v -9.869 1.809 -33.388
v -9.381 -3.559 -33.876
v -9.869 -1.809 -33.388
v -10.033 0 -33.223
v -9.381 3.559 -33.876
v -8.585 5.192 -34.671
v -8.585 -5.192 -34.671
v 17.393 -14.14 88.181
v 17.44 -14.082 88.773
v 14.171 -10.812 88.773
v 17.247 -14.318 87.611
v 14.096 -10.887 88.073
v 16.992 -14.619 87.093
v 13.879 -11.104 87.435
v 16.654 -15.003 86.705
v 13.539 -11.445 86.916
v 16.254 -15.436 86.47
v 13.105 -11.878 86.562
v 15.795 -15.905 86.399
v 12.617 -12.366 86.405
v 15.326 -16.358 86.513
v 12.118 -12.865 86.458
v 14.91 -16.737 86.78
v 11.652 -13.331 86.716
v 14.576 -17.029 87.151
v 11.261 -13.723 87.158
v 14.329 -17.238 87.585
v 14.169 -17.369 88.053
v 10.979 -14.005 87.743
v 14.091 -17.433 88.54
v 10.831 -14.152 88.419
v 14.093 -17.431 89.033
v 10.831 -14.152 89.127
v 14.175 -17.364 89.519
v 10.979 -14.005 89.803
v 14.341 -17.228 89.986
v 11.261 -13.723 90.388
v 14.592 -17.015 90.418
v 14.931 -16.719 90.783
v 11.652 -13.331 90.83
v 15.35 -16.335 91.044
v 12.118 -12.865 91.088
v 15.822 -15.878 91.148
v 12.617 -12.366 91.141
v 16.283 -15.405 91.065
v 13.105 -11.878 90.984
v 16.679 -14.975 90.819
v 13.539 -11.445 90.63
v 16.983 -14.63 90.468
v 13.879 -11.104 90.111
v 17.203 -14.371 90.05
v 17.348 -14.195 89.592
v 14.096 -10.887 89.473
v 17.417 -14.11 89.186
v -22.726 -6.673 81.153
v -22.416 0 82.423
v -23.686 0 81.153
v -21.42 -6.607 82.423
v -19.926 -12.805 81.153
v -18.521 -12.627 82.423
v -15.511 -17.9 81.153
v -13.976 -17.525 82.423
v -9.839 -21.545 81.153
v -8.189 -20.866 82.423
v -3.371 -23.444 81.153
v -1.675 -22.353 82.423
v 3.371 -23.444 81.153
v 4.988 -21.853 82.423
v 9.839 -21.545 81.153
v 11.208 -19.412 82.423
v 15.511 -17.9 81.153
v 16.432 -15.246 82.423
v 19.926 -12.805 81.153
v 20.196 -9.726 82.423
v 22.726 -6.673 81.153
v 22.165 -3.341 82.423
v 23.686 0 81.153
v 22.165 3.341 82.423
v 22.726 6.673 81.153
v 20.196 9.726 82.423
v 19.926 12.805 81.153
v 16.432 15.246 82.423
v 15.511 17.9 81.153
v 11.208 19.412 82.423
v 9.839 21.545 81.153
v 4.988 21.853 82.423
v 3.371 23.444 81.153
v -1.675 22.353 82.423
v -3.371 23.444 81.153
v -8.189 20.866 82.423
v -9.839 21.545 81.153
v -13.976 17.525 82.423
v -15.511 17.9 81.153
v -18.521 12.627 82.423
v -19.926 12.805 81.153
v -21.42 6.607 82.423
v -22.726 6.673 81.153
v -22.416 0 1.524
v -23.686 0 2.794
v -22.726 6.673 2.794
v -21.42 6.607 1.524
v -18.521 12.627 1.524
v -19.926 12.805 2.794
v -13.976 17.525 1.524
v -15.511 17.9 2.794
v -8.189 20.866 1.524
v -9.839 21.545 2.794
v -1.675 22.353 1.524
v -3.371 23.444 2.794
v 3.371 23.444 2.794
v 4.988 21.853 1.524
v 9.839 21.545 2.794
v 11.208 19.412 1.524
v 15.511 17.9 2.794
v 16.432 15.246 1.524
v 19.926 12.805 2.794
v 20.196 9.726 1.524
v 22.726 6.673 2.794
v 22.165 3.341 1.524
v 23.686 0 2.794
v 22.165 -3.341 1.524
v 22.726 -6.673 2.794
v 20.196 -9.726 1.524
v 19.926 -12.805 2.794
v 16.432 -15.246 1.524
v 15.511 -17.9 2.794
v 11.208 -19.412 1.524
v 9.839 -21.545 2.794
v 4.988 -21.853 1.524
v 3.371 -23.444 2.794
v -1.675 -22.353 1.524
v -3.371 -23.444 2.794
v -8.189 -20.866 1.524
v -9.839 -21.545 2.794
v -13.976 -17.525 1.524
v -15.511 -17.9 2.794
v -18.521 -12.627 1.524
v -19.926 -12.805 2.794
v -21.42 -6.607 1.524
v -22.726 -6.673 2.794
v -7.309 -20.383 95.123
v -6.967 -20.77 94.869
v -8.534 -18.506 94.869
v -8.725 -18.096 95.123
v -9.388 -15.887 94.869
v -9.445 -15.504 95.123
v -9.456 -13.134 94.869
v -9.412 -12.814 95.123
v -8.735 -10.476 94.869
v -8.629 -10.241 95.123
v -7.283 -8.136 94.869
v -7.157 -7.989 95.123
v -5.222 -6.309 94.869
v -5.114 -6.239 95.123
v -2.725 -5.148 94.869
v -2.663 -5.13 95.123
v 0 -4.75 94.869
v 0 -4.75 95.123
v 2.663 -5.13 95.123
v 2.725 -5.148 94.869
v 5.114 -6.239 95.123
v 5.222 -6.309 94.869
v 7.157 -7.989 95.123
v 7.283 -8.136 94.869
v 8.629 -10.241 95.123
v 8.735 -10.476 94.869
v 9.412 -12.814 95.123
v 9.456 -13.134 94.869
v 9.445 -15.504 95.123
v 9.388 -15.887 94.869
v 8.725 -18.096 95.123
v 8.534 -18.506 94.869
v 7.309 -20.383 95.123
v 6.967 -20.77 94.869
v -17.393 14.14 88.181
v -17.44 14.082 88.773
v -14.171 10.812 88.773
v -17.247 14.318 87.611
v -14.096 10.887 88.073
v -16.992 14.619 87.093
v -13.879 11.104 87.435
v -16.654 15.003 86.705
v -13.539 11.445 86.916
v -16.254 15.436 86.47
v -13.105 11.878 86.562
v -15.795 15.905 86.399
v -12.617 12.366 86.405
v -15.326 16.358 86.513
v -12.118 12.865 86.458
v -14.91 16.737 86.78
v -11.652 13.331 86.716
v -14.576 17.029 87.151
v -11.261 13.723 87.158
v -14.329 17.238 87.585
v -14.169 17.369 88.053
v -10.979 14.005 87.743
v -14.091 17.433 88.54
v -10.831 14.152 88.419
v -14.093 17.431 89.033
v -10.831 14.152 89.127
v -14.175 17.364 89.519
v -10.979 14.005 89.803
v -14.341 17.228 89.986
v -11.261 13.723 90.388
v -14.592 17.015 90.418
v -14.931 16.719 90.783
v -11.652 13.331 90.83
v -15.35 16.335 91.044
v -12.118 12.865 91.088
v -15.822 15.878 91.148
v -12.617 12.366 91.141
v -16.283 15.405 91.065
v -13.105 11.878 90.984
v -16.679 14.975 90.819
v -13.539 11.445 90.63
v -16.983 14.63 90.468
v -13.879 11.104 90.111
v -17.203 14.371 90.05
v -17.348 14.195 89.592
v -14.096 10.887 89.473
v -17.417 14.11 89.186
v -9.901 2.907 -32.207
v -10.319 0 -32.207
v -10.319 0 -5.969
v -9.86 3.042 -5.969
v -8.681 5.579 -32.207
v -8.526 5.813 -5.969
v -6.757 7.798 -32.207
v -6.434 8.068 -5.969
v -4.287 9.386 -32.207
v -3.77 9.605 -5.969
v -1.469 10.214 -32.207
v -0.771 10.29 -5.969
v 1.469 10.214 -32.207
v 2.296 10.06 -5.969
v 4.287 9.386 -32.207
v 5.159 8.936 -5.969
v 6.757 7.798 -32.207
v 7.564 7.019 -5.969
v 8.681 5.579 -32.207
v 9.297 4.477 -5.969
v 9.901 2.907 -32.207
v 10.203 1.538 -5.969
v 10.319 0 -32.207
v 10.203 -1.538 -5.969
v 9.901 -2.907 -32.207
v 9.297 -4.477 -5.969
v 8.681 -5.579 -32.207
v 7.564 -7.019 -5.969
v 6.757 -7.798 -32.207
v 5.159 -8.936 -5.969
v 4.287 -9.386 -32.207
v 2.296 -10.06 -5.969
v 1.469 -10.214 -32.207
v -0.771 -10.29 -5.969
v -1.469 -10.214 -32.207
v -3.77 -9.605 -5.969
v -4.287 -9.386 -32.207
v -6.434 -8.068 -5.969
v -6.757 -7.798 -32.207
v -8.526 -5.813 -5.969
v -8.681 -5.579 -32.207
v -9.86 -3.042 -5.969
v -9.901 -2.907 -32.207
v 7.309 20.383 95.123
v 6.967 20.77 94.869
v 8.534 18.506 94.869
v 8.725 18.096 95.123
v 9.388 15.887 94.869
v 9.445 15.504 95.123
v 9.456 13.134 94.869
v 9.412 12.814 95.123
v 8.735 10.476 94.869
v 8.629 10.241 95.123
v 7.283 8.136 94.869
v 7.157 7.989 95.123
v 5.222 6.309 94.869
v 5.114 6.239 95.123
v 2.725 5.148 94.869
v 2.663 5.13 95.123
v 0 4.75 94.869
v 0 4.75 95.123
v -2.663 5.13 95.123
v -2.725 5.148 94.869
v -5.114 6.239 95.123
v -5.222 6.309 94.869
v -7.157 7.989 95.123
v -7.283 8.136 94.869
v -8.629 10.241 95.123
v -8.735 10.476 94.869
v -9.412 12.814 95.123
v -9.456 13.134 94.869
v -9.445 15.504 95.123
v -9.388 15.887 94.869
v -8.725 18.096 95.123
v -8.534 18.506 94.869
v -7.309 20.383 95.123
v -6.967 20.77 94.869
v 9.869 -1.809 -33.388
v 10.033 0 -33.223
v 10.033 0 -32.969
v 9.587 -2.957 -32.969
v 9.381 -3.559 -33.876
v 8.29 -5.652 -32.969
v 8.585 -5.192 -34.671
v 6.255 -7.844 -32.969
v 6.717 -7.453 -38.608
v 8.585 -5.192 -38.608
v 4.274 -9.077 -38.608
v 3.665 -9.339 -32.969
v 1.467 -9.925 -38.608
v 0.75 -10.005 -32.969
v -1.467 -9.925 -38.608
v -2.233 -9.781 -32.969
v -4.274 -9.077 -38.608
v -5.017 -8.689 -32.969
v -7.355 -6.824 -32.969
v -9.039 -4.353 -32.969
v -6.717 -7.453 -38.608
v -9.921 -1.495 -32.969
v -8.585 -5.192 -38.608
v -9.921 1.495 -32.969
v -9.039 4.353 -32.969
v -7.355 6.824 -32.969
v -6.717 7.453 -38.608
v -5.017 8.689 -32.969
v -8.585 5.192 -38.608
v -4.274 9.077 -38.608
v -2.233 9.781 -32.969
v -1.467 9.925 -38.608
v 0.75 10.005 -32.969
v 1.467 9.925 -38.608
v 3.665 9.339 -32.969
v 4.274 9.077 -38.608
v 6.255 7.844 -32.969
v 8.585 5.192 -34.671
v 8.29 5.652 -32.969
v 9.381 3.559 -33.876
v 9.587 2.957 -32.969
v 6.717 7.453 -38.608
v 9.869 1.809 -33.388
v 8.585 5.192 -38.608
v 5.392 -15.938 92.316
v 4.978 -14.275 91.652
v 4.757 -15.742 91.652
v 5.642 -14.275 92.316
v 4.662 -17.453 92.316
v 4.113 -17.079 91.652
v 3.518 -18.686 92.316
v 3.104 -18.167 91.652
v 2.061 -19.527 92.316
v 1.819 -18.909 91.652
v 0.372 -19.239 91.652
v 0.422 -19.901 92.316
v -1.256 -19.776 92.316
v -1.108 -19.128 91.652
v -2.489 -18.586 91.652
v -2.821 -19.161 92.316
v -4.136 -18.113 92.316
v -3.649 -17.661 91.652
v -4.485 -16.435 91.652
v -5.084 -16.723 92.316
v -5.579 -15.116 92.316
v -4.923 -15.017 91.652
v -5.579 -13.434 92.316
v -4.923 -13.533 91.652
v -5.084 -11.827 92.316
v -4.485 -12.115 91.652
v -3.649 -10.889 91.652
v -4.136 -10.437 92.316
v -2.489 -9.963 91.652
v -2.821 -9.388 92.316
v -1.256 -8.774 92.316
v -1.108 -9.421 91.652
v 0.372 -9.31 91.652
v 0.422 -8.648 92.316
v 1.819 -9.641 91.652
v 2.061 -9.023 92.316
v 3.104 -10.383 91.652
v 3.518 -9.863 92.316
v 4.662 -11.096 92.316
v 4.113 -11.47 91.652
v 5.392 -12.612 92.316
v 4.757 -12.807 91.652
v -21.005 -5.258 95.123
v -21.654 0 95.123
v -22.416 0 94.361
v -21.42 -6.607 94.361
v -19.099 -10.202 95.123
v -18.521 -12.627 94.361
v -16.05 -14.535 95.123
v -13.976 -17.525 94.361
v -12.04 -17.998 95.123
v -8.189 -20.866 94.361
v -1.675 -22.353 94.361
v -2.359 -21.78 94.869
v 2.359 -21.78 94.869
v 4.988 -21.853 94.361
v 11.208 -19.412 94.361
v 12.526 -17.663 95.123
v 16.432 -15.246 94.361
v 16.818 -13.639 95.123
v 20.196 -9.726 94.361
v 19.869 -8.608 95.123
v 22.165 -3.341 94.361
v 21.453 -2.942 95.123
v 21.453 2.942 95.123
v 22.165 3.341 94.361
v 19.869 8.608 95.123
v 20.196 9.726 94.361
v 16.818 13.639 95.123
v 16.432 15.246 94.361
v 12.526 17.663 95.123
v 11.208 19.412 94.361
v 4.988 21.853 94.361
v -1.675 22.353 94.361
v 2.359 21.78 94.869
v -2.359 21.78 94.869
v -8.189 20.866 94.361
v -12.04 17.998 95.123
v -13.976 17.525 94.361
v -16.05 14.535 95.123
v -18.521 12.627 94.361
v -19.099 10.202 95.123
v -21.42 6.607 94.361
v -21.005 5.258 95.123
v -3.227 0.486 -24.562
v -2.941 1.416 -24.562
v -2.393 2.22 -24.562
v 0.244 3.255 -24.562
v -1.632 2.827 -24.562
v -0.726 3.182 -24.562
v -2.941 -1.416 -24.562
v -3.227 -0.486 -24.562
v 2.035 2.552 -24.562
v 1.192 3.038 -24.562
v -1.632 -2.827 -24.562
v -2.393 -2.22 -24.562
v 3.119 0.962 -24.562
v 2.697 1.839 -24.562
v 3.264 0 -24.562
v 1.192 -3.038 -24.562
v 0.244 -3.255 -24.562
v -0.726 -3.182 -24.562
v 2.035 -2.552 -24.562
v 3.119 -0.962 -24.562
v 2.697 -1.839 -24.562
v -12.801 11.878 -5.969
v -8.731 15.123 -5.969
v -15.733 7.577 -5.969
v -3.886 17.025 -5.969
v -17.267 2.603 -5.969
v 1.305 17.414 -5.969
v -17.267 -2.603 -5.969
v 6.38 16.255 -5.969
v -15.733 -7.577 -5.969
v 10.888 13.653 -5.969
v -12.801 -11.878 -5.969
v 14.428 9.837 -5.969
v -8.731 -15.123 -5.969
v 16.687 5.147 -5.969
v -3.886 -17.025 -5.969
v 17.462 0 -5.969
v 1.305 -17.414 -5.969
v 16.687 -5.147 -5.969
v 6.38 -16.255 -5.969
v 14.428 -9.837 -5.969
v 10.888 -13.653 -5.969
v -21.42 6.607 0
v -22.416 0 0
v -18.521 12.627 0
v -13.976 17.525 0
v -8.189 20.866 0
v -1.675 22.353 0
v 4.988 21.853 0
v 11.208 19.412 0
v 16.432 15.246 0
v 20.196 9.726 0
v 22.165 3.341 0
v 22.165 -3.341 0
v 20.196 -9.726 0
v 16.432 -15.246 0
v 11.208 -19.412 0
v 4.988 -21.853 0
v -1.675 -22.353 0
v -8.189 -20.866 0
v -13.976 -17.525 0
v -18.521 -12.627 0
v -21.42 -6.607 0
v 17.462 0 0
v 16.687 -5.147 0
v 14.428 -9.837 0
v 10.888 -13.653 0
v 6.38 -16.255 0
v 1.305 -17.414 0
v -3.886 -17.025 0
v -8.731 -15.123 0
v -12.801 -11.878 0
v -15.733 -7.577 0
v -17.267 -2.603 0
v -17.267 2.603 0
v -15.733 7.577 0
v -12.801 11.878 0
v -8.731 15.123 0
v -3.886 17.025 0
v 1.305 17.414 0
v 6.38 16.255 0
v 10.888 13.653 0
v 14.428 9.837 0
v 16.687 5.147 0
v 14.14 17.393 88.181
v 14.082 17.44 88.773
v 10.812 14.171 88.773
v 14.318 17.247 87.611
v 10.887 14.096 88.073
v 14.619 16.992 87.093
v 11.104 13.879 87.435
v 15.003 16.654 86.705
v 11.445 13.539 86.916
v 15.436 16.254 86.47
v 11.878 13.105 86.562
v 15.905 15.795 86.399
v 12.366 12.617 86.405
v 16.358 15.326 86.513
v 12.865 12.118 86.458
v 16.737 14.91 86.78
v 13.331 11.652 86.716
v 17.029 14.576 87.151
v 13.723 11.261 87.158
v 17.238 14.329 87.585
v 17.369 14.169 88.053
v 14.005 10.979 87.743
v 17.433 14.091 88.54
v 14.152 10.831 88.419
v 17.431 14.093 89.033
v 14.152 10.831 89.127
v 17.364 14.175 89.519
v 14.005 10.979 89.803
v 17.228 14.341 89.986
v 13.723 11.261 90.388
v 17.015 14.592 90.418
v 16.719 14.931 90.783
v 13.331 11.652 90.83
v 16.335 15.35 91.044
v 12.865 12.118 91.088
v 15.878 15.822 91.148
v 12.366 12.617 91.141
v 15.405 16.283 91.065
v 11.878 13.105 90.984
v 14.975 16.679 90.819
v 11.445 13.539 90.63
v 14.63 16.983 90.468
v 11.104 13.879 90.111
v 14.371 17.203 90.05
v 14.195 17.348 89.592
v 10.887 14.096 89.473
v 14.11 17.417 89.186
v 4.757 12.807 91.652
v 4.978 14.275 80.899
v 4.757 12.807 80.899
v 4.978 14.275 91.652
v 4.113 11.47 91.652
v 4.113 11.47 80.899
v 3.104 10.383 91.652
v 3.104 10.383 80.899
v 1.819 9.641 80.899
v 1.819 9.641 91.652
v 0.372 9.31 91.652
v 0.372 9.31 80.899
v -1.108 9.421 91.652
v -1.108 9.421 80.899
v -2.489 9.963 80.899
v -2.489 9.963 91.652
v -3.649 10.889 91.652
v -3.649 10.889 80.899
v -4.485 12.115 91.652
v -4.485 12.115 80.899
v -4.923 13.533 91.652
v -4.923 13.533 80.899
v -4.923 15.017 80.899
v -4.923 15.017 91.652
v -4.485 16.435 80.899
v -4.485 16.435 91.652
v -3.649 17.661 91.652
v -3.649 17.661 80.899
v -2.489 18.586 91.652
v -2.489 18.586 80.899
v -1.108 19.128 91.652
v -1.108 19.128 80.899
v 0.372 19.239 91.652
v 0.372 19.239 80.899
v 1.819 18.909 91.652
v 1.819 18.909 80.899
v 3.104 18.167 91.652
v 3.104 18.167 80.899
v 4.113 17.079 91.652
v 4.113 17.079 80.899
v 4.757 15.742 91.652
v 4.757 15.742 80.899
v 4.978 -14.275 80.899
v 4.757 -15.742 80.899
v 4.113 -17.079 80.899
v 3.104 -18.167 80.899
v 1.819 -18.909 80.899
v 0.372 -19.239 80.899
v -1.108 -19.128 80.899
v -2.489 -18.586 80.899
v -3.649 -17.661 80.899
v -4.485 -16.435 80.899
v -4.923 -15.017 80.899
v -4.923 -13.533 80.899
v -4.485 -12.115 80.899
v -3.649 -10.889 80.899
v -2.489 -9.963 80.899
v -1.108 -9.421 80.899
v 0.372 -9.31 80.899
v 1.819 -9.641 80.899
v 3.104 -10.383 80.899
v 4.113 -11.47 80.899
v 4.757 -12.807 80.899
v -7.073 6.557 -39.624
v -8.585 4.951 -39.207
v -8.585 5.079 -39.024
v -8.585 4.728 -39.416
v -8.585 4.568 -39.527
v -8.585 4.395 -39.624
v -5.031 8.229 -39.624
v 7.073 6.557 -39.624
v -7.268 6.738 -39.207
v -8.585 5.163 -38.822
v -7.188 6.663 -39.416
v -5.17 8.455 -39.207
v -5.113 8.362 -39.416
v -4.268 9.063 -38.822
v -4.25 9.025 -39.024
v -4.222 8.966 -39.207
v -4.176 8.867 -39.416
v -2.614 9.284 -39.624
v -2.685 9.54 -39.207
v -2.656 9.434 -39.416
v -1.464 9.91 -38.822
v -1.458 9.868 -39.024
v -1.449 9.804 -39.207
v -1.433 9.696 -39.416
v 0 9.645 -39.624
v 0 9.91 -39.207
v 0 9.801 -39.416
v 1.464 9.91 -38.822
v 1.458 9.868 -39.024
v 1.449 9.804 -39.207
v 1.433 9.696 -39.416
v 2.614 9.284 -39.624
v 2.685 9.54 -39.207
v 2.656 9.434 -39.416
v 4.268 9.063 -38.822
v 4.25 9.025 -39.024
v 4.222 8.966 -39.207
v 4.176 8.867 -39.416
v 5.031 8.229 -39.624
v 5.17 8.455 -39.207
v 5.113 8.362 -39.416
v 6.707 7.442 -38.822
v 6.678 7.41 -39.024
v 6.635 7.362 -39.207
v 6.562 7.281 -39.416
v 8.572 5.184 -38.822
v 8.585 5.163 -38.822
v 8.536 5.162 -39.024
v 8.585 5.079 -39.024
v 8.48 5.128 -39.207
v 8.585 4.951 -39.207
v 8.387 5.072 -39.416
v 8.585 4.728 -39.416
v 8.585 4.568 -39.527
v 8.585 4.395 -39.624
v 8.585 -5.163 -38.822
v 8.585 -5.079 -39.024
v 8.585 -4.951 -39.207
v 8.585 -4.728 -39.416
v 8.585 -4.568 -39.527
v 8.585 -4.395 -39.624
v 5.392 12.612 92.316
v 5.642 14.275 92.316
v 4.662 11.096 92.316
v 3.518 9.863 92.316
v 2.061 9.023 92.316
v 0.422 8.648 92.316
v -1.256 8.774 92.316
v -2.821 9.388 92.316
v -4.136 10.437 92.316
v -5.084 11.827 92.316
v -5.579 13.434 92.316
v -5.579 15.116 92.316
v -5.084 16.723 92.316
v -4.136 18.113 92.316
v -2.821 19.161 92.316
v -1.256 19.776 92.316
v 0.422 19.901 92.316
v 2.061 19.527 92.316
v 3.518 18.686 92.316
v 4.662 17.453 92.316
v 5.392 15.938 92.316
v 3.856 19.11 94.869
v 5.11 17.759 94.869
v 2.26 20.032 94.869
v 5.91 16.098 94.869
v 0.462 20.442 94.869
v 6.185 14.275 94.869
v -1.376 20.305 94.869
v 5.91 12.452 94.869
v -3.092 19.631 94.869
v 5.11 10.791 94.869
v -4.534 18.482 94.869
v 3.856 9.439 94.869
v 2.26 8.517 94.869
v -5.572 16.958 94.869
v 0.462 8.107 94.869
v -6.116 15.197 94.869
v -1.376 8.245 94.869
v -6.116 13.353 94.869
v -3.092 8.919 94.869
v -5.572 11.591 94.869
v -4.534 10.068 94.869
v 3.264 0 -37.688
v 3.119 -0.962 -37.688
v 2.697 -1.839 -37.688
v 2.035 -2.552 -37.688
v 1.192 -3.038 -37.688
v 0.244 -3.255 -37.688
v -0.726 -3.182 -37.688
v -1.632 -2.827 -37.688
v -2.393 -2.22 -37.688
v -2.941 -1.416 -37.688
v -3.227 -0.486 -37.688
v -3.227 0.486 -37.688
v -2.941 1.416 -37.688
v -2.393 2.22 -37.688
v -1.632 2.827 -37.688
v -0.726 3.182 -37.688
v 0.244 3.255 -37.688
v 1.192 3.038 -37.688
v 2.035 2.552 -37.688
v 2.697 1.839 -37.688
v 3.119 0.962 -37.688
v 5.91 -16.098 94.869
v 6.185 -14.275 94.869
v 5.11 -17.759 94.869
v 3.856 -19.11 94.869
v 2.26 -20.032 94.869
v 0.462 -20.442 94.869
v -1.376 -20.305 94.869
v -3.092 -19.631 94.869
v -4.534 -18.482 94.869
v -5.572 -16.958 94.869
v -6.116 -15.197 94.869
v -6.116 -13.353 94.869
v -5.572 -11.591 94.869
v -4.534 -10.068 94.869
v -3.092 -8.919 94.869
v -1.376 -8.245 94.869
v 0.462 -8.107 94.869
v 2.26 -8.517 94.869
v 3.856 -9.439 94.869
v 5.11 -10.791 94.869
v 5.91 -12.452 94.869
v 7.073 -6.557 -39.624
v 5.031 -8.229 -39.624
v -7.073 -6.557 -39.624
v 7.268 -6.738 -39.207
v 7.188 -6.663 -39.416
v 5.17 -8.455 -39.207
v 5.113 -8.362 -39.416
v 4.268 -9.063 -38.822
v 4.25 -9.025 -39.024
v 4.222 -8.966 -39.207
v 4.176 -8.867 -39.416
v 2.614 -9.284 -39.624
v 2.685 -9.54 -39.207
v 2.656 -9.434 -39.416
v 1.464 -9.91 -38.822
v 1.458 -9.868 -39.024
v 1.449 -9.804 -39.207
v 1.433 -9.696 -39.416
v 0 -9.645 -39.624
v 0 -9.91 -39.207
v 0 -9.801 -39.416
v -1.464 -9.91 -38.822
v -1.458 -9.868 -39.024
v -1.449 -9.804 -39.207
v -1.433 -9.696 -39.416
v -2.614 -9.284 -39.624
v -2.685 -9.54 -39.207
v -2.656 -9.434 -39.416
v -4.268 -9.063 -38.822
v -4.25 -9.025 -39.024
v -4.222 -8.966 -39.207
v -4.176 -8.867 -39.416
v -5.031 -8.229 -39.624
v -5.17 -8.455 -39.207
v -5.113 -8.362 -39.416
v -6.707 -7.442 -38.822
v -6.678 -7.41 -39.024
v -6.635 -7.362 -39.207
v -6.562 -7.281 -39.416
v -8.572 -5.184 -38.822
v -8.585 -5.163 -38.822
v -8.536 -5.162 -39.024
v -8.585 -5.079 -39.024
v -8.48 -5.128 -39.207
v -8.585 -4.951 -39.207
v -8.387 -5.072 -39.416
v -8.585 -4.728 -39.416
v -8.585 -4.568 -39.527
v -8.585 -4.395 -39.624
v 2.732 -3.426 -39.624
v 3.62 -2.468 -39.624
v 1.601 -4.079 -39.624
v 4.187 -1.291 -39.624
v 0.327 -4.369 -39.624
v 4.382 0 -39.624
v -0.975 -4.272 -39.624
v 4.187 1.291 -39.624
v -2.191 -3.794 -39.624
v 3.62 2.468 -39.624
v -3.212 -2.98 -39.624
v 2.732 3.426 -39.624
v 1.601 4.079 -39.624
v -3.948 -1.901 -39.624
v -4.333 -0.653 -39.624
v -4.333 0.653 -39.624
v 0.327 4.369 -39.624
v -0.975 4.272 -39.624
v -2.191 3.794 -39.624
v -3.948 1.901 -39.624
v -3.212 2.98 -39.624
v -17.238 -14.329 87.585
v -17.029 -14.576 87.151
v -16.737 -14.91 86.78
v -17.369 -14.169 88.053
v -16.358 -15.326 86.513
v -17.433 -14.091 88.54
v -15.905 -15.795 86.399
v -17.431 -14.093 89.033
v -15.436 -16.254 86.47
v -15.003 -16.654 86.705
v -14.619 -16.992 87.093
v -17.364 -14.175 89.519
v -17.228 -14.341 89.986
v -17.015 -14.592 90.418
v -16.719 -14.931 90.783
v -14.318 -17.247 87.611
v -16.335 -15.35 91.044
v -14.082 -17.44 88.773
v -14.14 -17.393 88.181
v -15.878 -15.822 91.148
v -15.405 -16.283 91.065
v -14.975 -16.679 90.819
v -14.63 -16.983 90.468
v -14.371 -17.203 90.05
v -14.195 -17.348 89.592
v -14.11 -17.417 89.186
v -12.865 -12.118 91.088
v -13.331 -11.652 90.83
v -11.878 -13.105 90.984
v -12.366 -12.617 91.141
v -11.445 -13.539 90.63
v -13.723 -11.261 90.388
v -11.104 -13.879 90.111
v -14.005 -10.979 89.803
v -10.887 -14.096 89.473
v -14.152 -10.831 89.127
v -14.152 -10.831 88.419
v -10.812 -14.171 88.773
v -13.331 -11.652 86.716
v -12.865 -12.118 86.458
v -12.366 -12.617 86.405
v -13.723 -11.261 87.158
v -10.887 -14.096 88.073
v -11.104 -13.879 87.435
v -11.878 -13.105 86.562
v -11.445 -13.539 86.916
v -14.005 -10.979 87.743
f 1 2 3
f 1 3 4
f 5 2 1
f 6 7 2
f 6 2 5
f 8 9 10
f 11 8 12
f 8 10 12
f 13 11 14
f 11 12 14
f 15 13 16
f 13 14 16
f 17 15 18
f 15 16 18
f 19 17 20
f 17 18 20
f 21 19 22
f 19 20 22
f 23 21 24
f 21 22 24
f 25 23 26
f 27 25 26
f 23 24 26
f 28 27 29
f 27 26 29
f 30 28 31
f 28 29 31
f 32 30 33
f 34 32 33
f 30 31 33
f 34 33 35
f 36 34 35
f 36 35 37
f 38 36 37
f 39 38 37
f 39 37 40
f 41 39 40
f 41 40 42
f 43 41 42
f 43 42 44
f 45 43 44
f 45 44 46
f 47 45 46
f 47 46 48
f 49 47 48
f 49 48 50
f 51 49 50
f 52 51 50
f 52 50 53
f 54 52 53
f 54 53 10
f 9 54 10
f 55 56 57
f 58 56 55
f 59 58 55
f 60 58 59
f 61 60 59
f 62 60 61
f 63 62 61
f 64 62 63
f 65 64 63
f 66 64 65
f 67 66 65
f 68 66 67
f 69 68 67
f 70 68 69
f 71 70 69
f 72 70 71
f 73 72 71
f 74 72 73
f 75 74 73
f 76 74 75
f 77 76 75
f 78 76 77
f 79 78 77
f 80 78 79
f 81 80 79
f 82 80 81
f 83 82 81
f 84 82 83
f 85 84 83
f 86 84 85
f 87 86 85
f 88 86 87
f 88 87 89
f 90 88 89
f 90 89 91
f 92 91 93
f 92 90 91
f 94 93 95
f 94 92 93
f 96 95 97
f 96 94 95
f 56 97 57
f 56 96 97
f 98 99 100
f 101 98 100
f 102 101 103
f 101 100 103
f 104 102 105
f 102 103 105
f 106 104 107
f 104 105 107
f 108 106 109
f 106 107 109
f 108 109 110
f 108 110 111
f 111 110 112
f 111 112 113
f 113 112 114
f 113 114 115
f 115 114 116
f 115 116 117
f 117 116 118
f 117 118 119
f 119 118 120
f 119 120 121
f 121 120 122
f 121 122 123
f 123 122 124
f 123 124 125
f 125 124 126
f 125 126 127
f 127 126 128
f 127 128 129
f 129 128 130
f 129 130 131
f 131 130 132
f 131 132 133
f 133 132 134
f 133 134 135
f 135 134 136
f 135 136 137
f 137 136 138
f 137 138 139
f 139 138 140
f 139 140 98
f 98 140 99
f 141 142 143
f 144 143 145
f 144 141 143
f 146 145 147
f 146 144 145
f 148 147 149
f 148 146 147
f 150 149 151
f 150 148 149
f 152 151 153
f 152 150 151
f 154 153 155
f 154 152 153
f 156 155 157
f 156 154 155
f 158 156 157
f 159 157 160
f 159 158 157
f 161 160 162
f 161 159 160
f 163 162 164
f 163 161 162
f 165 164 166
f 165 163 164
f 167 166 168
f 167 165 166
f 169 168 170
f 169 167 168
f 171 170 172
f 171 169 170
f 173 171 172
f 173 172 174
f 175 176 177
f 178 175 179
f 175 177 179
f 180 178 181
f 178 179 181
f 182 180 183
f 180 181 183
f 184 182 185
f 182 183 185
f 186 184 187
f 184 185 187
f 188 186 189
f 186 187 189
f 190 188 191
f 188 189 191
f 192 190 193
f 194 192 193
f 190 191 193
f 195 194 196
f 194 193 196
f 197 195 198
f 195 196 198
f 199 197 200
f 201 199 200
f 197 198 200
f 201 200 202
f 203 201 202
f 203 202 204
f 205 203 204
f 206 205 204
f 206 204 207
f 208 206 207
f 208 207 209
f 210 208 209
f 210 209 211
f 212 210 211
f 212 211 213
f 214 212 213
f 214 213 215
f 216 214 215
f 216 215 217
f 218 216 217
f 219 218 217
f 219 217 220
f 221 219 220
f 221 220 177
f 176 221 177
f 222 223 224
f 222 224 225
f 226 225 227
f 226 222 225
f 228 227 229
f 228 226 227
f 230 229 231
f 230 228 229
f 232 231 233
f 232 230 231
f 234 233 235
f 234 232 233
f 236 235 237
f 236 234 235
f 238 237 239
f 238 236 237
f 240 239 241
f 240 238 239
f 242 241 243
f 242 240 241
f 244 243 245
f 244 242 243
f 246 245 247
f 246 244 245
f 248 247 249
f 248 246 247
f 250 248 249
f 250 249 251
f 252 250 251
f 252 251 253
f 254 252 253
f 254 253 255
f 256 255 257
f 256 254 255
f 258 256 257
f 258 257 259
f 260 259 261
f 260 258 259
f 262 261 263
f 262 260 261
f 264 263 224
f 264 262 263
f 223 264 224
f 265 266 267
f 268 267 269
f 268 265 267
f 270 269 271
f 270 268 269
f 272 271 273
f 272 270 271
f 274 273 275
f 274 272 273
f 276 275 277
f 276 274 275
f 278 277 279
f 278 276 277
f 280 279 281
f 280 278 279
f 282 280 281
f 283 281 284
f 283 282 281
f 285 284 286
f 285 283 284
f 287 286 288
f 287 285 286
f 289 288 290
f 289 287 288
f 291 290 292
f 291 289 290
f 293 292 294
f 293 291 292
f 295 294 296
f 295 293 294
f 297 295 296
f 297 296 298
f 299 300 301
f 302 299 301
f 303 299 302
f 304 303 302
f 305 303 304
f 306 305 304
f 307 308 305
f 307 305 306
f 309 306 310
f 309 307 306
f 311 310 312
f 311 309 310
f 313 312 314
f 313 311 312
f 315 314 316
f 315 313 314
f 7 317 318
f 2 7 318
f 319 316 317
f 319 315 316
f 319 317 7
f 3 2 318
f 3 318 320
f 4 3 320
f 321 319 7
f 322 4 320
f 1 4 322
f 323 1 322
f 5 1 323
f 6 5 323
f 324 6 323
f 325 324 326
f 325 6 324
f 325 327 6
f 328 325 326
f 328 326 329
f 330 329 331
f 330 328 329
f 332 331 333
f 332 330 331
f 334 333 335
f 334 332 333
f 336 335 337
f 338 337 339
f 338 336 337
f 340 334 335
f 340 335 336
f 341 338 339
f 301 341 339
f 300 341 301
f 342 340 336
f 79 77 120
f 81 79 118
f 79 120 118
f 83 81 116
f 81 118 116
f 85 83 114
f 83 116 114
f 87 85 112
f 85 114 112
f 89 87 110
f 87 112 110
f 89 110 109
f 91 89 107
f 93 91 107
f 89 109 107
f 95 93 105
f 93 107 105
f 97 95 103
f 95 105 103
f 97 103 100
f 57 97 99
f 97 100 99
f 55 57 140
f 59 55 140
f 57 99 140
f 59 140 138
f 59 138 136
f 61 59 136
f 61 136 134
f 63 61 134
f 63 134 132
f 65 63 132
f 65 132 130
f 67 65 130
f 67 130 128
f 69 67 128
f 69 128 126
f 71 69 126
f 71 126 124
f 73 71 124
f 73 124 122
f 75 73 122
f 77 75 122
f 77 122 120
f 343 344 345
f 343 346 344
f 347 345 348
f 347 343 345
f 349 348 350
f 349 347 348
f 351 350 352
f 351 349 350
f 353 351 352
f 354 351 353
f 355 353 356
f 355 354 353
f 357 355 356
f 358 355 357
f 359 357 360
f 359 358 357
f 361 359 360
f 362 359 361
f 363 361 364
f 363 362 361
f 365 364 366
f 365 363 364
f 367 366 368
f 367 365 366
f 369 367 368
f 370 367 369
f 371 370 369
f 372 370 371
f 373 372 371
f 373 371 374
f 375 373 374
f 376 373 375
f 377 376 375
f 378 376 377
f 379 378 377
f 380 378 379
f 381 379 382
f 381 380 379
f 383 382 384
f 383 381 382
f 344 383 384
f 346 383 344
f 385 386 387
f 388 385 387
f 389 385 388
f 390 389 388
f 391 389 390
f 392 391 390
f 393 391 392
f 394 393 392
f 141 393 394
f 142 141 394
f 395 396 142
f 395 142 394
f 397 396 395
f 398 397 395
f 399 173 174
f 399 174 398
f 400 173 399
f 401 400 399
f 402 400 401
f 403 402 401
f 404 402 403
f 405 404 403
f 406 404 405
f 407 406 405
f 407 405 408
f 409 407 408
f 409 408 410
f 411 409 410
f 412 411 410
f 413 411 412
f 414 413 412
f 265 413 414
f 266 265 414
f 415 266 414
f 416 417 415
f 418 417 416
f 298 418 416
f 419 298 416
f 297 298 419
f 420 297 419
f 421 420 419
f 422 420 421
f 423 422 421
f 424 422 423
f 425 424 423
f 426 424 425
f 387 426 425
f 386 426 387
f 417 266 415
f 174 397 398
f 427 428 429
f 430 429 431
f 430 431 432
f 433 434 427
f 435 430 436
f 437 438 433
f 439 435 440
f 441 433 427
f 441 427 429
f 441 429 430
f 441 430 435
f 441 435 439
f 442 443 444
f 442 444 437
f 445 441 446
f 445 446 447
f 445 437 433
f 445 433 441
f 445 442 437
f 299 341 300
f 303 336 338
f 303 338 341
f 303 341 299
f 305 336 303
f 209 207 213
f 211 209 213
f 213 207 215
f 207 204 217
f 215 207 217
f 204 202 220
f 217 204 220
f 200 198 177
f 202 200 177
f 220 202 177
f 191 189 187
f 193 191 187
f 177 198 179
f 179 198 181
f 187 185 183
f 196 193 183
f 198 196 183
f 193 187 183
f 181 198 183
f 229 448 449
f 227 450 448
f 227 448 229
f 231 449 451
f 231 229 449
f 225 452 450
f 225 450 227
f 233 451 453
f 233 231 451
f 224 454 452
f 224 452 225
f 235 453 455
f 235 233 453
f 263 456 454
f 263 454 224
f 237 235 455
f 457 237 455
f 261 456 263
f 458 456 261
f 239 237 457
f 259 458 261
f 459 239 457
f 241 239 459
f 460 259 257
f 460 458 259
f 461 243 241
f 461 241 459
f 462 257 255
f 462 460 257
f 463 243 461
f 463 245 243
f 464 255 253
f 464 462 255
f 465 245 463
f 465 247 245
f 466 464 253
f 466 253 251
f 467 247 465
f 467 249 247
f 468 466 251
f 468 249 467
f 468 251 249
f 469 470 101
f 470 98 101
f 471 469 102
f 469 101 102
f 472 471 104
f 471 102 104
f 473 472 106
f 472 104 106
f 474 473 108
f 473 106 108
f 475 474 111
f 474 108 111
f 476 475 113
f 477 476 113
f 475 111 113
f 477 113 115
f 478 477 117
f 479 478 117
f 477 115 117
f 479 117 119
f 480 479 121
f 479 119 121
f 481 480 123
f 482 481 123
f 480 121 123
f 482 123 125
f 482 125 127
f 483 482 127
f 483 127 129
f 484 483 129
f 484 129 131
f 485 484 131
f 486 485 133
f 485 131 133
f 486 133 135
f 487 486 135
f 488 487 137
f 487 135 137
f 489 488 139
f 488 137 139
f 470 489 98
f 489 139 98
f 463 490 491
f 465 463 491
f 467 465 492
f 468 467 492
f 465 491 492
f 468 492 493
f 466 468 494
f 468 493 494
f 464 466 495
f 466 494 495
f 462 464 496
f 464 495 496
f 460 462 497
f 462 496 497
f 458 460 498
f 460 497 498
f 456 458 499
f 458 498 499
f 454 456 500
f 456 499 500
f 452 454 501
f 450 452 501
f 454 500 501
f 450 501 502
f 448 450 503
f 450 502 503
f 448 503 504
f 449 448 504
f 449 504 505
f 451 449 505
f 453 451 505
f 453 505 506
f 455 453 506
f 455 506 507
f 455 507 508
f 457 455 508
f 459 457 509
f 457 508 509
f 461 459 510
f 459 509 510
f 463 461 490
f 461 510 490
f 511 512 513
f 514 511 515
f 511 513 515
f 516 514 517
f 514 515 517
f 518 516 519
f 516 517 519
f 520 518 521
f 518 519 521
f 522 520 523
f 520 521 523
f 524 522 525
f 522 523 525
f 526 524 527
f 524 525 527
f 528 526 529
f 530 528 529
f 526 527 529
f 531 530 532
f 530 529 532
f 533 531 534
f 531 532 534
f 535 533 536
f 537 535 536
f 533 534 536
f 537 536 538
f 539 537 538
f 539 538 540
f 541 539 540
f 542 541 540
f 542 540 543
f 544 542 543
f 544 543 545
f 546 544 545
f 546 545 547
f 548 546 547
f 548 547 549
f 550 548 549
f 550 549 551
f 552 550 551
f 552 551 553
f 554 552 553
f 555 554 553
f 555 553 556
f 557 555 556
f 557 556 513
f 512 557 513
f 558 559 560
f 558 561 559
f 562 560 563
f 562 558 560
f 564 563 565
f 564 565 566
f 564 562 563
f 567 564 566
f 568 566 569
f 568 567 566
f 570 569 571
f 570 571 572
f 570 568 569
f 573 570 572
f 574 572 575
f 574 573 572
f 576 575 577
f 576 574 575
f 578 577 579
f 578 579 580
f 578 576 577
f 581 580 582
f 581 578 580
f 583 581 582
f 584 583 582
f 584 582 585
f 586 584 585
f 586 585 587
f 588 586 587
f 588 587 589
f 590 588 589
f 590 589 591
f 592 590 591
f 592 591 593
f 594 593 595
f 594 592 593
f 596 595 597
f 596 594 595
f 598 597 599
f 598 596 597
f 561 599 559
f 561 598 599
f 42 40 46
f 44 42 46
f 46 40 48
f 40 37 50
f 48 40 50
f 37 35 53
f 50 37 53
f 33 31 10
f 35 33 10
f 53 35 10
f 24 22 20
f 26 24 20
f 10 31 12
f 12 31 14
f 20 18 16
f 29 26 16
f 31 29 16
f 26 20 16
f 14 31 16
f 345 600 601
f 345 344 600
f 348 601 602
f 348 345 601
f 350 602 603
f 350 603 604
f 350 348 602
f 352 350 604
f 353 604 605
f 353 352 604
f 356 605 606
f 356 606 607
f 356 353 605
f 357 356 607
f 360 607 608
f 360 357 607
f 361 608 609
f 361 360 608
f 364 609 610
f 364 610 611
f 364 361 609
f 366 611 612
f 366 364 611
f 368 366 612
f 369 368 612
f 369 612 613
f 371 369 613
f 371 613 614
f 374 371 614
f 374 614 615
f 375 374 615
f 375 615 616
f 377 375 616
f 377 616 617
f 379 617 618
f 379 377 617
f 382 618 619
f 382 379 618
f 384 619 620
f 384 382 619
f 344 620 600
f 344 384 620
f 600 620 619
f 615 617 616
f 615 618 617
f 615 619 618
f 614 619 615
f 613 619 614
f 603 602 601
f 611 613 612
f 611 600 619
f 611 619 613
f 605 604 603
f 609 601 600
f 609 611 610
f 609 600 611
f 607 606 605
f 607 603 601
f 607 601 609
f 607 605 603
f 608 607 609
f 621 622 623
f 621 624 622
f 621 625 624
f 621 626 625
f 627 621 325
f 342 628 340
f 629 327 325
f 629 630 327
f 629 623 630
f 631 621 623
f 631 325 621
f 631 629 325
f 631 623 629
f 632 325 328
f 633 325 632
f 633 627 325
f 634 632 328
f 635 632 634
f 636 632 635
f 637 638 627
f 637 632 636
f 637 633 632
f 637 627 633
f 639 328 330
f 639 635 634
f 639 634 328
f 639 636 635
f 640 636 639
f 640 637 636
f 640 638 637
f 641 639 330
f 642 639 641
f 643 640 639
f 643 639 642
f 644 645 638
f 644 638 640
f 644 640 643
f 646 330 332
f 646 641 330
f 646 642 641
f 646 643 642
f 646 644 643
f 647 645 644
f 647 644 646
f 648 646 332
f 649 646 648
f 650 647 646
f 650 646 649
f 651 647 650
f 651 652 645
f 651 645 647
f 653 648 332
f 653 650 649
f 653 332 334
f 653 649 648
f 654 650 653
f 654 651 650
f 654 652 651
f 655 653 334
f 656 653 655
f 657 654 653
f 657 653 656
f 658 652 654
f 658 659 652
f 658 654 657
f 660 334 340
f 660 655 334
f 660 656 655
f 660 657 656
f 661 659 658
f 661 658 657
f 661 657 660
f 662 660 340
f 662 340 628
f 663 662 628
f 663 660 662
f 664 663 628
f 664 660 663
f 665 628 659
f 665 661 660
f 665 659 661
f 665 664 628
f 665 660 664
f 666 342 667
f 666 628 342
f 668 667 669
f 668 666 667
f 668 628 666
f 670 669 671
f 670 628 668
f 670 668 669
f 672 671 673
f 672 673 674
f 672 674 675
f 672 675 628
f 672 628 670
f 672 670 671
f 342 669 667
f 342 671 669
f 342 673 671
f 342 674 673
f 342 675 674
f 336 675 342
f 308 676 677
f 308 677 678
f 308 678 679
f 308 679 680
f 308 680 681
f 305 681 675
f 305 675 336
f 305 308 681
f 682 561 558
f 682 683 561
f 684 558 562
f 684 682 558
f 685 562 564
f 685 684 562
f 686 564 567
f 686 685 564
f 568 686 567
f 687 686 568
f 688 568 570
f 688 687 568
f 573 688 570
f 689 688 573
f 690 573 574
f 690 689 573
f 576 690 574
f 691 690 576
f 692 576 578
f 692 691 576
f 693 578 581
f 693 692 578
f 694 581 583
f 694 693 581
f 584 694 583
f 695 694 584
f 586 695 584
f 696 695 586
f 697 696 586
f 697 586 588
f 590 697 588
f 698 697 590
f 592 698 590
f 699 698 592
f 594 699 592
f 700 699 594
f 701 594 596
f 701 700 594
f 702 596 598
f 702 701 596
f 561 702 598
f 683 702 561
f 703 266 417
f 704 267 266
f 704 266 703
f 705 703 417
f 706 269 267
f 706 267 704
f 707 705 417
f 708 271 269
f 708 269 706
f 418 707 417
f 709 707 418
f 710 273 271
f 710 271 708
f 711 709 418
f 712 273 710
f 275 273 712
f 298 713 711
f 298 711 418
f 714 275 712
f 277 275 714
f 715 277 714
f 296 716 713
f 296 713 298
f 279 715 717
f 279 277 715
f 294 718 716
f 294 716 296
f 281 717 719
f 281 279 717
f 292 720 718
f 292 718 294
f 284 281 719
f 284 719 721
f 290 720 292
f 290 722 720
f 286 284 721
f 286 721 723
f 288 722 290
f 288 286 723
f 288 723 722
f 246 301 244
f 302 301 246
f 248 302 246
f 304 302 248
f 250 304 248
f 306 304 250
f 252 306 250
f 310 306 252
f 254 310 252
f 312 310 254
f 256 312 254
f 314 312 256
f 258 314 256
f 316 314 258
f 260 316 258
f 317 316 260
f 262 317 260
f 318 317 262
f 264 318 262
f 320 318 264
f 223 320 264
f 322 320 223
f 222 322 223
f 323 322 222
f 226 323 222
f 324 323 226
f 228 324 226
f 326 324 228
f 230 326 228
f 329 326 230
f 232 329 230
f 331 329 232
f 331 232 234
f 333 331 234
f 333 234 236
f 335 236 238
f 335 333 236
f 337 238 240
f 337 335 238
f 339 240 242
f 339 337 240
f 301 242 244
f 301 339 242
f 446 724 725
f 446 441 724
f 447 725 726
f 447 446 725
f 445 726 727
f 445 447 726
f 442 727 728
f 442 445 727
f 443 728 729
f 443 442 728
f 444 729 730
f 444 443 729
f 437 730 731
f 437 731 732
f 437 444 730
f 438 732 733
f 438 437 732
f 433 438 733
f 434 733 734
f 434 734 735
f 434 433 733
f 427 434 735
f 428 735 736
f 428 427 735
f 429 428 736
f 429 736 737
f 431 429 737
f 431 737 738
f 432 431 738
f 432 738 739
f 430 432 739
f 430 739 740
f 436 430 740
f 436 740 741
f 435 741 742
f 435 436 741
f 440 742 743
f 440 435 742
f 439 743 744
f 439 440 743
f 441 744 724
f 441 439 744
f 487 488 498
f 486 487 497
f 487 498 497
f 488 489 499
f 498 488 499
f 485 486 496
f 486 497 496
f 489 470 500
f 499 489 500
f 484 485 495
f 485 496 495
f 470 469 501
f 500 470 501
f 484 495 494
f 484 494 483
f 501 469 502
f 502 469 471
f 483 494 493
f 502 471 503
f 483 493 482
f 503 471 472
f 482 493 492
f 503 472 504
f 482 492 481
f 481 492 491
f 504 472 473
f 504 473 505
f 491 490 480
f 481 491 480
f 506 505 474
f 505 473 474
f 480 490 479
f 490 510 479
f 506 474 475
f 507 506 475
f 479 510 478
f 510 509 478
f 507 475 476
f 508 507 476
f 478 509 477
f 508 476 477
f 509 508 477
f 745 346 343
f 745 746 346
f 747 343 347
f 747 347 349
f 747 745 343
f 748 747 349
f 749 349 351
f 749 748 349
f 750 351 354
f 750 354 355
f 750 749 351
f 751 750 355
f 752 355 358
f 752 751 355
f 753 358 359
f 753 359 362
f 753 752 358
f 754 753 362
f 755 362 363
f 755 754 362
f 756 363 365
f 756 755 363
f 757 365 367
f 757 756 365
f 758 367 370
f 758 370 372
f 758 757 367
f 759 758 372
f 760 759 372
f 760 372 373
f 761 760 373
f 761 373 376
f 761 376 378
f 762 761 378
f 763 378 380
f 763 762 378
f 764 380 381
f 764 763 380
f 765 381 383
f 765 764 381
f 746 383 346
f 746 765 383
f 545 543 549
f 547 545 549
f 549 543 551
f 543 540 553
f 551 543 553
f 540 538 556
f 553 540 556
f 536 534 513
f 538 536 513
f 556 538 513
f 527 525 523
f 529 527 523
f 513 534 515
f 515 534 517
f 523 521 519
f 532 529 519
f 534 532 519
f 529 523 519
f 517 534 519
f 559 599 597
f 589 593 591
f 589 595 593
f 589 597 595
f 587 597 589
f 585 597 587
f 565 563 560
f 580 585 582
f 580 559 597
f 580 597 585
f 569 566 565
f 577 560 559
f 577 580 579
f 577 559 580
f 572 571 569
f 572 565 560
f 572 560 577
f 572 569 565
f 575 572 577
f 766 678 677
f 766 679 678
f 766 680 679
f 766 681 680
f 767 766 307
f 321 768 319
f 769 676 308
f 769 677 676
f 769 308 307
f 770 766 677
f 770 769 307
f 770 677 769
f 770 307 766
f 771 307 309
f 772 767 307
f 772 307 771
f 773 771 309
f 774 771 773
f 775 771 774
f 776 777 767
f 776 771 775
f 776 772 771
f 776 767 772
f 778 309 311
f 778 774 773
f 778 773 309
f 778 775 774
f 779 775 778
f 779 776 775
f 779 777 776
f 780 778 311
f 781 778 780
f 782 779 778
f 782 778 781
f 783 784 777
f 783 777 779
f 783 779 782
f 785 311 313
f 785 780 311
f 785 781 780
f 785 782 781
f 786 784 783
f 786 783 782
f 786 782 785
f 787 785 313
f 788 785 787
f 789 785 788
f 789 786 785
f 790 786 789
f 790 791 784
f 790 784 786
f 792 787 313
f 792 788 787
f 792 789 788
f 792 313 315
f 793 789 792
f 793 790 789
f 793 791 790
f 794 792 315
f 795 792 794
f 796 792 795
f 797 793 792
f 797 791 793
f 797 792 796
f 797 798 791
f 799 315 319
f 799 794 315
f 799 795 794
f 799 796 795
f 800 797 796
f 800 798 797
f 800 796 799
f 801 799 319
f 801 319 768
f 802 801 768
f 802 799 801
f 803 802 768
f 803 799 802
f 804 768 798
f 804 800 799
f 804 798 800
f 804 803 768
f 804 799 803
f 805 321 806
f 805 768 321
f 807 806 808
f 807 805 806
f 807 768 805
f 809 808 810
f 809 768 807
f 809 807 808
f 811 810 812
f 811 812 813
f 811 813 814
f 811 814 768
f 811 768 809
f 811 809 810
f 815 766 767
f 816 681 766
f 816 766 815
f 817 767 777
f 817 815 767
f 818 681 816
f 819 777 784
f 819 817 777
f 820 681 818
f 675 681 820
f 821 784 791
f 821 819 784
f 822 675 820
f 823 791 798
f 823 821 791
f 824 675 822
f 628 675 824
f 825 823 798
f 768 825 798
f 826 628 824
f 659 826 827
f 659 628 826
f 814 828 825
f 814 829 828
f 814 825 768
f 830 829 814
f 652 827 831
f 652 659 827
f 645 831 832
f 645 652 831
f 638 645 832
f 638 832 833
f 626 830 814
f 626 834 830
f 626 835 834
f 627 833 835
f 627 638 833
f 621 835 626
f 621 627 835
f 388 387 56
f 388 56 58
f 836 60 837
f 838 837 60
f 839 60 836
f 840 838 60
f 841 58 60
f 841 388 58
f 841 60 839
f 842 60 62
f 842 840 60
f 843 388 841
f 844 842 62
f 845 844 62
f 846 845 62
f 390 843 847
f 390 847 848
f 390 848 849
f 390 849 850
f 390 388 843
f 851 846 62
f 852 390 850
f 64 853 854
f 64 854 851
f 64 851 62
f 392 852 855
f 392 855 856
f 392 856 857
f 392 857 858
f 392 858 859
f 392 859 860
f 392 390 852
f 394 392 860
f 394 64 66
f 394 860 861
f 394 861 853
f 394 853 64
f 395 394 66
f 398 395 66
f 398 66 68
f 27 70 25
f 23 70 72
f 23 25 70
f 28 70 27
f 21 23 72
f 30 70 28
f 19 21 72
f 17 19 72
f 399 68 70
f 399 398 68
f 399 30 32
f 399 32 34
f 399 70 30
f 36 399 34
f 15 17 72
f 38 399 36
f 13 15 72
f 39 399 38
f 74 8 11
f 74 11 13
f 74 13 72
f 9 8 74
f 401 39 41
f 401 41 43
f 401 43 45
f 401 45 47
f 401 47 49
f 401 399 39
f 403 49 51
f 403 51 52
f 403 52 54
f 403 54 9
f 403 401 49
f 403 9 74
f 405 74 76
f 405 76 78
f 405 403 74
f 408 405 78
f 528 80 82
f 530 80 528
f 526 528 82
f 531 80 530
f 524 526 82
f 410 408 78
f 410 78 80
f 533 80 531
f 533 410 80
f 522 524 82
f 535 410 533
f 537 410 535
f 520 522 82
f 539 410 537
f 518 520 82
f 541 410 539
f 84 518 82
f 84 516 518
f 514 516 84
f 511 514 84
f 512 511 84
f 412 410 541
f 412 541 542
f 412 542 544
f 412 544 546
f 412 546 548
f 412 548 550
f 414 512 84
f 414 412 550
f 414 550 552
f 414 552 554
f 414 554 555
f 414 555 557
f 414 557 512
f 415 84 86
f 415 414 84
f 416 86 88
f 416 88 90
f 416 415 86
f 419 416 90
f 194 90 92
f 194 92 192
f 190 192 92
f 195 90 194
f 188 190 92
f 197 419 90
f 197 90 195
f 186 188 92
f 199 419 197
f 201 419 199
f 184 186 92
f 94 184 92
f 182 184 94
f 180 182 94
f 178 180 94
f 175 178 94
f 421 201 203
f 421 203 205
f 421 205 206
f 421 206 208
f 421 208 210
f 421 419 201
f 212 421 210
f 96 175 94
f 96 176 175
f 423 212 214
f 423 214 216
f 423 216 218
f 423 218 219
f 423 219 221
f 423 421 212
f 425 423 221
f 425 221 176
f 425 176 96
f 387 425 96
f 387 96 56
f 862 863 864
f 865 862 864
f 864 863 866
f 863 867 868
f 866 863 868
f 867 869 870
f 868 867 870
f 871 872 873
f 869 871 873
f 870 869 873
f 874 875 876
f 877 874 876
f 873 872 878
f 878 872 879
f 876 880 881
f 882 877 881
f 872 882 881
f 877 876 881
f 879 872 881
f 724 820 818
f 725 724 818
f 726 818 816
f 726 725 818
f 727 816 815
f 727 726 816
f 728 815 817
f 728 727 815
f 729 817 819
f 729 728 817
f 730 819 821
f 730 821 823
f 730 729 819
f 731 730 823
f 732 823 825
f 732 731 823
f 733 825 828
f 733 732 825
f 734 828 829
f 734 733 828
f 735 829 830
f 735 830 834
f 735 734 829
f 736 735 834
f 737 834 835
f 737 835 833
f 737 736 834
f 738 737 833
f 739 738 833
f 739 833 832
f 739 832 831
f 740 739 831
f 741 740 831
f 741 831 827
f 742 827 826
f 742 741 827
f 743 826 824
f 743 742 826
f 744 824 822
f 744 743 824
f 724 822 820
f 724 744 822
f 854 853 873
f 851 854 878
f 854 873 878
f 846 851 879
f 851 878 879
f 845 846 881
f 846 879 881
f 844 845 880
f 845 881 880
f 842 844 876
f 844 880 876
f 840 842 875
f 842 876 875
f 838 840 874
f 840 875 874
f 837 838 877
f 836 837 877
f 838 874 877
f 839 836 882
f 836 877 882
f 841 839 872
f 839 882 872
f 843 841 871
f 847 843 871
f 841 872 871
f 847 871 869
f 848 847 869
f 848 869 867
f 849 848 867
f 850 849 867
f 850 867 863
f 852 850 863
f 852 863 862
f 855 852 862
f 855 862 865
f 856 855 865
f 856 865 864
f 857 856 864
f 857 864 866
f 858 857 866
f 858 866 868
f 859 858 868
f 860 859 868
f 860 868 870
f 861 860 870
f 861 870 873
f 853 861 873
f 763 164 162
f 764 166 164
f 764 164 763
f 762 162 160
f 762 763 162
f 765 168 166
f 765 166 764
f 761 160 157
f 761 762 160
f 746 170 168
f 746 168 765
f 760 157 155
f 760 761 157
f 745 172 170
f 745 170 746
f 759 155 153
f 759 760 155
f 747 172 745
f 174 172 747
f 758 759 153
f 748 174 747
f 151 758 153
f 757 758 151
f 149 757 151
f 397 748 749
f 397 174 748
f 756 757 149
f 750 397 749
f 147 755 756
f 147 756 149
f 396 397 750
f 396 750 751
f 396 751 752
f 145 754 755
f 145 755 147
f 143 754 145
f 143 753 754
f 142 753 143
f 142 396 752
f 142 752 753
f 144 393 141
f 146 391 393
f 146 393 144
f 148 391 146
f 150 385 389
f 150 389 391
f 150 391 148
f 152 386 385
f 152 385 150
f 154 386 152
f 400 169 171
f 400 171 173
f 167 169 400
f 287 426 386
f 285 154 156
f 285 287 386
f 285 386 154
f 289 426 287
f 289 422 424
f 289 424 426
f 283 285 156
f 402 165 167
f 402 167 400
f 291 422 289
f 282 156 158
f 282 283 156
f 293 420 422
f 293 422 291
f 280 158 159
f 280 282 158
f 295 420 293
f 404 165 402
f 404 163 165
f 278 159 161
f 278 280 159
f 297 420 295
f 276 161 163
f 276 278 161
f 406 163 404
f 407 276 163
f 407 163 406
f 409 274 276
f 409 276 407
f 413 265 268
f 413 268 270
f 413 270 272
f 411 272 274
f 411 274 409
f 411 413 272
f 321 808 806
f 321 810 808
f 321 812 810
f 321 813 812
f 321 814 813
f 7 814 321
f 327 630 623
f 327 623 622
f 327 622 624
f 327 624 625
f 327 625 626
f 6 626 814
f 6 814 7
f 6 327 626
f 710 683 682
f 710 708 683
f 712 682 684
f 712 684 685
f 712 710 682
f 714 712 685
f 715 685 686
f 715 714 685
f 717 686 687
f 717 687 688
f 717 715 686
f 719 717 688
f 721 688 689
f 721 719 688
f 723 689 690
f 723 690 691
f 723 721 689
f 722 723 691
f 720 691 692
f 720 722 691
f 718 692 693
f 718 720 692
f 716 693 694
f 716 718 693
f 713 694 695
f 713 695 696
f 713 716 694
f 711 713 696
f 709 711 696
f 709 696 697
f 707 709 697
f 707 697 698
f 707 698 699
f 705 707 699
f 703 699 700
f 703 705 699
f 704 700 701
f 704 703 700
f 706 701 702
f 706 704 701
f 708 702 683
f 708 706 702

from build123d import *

# Parameters (mm, degrees)
SKETCH1_R          = 23.6855
EXTRUDE1_DEPTH     = 95.123
CHAMFER1_SIZE      = 0.762
SKETCH6_R          = 17.4625
EXTRUDE2_DEPTH     = 5.969
SKETCH7_W          = 33.655
SKETCH7_H          = 10.31875
CUT_EXTRUDE4_DEPTH = 19.84248
HOLE1_D            = 4.7498
HOLE1_DEPTH        = 4.7498
CIRPATTERN1_COUNT  = 4
LPATTERN1_COUNT    = 2
LPATTERN1_PITCH    = 28.5496


with BuildPart() as part:
    # Sketch1 → Extrude1 (new body)
    with BuildSketch(Plane.XY):
        Circle(SKETCH1_R)
    extrude(amount=EXTRUDE1_DEPTH)

    # Sketch2 → Cut-Revolve1 (revolve, cut)
    with BuildSketch(Plane(origin=(0, 0, 0), x_dir=(1, 0, 0), z_dir=(0, 1, 0)), mode=Mode.PRIVATE) as cut_revolve1_sk:
        Polygon((23.6855, -95.123), (23.6855, -81.153), (22.4155, -82.423), (22.4155, -95.123), align=None)
    revolve(cut_revolve1_sk.sketch.rotate(Axis((0, 0, 0), (0, 0, 1)), 180), axis=Axis((0, 0, 0), (0, 0, 1)), mode=Mode.SUBTRACT)  # turned: the seam where the file's is

    # Sketch3 → Cut-Revolve2 (revolve, cut)
    with BuildSketch(Plane(origin=(0, 0, 0), x_dir=(1, 0, 0), z_dir=(0, 1, 0)), mode=Mode.PRIVATE) as cut_revolve2_sk:
        Polygon((22.4155, 0), (22.4155, -1.524), (23.6855, -2.794), (23.6855, 0), align=None)
    revolve(cut_revolve2_sk.sketch.rotate(Axis((0, 0, 0), (0, 0, -1)), 180), axis=Axis((0, 0, 0), (0, 0, -1)), mode=Mode.SUBTRACT)  # turned: the seam where the file's is

    # Chamfer1
    chamfer1_edges = [part.edges().sort_by_distance(p)[0] for p in [
        (22.4155, 0, 95.123),
    ]]
    chamfer(chamfer1_edges, length=CHAMFER1_SIZE)

    # S2D0002 → Cut-Revolve3 (revolve, cut)
    with BuildSketch(Plane(origin=(0, 0, 0), x_dir=(0, -1, 0), z_dir=(1, 0, 0)), mode=Mode.PRIVATE) as cut_revolve3_sk:
        Polygon((20.4597, -94.869), (23.7998, -94.869), (23.7998, -95.123), (14.2748, -95.123), (14.2748, -80.899), (19.2532, -80.899), (19.2532, -91.652393135), (19.917106865, -92.3163), align=None)
    cut_revolve3 = revolve(cut_revolve3_sk.sketch.rotate(Axis((0, -14.2748, 14.6685), (0, 0, -1)), 270), axis=Axis((0, -14.2748, 14.6685), (0, 0, -1)), mode=Mode.SUBTRACT)  # turned: the seam where the file's is

    # Sketch6 → Extrude2 (add)
    with BuildSketch(Plane(origin=(0, 0, 0), x_dir=(-1, 0, 0), z_dir=(0, 0, -1))):
        with Locations(Location((0, 0, 0), (0, 0, 180))):  # turned: the seam where the file's is
            Circle(SKETCH6_R)
    extrude(amount=EXTRUDE2_DEPTH)

    # Sketch7 → Revolve1 (revolve)
    with BuildSketch(Plane(origin=(0, 0, 0), x_dir=(0, 0, -1), z_dir=(1, 0, 0)), mode=Mode.PRIVATE) as revolve1_sk:
        with Locations((22.7965, -5.159375)):
            Rectangle(SKETCH7_W, SKETCH7_H)
    revolve(revolve1_sk.sketch.rotate(Axis((0, 0, 0), (0, 0, -1)), 90), axis=Axis((0, 0, 0), (0, 0, -1)))  # turned: the seam where the file's is

    # S2D0001 → Cut-Revolve5 (revolve, cut)
    with BuildSketch(Plane(origin=(0, 0, 0), x_dir=(1, 0, 0), z_dir=(0, 1, 0))):
        Polygon((3.2639, 37.688260017), (3.2639, 24.5618), (0, 24.5618), (0, 39.624), (4.3815, 39.624), align=None)
    revolve(axis=Axis((0, 0, 31.308359971), (0, 0, -1)), mode=Mode.SUBTRACT)

    # Sketch9 → Cut-Revolve6 (revolve, cut)
    with BuildSketch(Plane(origin=(0, 0, 0), x_dir=(0, -1, 0), z_dir=(1, 0, 0)), mode=Mode.PRIVATE) as cut_revolve6_sk:
        with BuildLine():
            Line((-10.31875, 32.2072), (-10.033, 32.9692))
            Line((-10.033, 32.9692), (-10.033, 38.608))
            ThreePointArc((-10.033, 38.608), (-9.932678675, 39.151796865), (-9.644922533, 39.624))
            Line((-9.644922533, 39.624), (-10.31875, 39.624))
            Line((-10.31875, 39.624), (-10.31875, 32.2072))
        make_face()
    revolve(cut_revolve6_sk.sketch.rotate(Axis((0, 0, -12.65936), (0, 0, -1)), 90), axis=Axis((0, 0, -12.65936), (0, 0, -1)), mode=Mode.SUBTRACT)  # turned: the seam where the file's is

    # Sketch13 → Cut-Extrude4 (cut, symmetric)
    with BuildSketch(Plane(origin=(0, 0, 0), x_dir=(1, 0, 0), z_dir=(0, 1, 0))):
        Polygon((8.5852, 39.624), (8.5852, 34.671), (10.033, 33.2232), (10.033, 39.624), align=None)
        Polygon((-8.5852, 39.624), (-8.5852, 34.671), (-10.033, 33.2232), (-10.033, 39.624), align=None)
    extrude(amount=CUT_EXTRUDE4_DEPTH, both=True, mode=Mode.SUBTRACT)

    # Hole1
    with Locations(Plane(origin=(-15.850152054, 15.850152054, 88.773), x_dir=(0.707106781, 0.707106781, 0), z_dir=(-0.707106781, 0.707106781, 0))):
        with Locations((0, 0)):
            hole1 = Hole(HOLE1_D / 2, depth=HOLE1_DEPTH)

    # CirPattern1: Hole1 ×4 about axis
    cirpattern1_axis = Axis((0, 0, 0), (0, 0, 1))
    for i in range(1, CIRPATTERN1_COUNT):
        add(hole1.rotate(cirpattern1_axis, i * 360 / CIRPATTERN1_COUNT), mode=Mode.SUBTRACT)

    # LPattern1: Cut-Revolve3 ×2
    with Locations(*[(0, i * LPATTERN1_PITCH, 0) for i in range(1, LPATTERN1_COUNT)]):
        add(cut_revolve3, mode=Mode.SUBTRACT)


solid = part.part
